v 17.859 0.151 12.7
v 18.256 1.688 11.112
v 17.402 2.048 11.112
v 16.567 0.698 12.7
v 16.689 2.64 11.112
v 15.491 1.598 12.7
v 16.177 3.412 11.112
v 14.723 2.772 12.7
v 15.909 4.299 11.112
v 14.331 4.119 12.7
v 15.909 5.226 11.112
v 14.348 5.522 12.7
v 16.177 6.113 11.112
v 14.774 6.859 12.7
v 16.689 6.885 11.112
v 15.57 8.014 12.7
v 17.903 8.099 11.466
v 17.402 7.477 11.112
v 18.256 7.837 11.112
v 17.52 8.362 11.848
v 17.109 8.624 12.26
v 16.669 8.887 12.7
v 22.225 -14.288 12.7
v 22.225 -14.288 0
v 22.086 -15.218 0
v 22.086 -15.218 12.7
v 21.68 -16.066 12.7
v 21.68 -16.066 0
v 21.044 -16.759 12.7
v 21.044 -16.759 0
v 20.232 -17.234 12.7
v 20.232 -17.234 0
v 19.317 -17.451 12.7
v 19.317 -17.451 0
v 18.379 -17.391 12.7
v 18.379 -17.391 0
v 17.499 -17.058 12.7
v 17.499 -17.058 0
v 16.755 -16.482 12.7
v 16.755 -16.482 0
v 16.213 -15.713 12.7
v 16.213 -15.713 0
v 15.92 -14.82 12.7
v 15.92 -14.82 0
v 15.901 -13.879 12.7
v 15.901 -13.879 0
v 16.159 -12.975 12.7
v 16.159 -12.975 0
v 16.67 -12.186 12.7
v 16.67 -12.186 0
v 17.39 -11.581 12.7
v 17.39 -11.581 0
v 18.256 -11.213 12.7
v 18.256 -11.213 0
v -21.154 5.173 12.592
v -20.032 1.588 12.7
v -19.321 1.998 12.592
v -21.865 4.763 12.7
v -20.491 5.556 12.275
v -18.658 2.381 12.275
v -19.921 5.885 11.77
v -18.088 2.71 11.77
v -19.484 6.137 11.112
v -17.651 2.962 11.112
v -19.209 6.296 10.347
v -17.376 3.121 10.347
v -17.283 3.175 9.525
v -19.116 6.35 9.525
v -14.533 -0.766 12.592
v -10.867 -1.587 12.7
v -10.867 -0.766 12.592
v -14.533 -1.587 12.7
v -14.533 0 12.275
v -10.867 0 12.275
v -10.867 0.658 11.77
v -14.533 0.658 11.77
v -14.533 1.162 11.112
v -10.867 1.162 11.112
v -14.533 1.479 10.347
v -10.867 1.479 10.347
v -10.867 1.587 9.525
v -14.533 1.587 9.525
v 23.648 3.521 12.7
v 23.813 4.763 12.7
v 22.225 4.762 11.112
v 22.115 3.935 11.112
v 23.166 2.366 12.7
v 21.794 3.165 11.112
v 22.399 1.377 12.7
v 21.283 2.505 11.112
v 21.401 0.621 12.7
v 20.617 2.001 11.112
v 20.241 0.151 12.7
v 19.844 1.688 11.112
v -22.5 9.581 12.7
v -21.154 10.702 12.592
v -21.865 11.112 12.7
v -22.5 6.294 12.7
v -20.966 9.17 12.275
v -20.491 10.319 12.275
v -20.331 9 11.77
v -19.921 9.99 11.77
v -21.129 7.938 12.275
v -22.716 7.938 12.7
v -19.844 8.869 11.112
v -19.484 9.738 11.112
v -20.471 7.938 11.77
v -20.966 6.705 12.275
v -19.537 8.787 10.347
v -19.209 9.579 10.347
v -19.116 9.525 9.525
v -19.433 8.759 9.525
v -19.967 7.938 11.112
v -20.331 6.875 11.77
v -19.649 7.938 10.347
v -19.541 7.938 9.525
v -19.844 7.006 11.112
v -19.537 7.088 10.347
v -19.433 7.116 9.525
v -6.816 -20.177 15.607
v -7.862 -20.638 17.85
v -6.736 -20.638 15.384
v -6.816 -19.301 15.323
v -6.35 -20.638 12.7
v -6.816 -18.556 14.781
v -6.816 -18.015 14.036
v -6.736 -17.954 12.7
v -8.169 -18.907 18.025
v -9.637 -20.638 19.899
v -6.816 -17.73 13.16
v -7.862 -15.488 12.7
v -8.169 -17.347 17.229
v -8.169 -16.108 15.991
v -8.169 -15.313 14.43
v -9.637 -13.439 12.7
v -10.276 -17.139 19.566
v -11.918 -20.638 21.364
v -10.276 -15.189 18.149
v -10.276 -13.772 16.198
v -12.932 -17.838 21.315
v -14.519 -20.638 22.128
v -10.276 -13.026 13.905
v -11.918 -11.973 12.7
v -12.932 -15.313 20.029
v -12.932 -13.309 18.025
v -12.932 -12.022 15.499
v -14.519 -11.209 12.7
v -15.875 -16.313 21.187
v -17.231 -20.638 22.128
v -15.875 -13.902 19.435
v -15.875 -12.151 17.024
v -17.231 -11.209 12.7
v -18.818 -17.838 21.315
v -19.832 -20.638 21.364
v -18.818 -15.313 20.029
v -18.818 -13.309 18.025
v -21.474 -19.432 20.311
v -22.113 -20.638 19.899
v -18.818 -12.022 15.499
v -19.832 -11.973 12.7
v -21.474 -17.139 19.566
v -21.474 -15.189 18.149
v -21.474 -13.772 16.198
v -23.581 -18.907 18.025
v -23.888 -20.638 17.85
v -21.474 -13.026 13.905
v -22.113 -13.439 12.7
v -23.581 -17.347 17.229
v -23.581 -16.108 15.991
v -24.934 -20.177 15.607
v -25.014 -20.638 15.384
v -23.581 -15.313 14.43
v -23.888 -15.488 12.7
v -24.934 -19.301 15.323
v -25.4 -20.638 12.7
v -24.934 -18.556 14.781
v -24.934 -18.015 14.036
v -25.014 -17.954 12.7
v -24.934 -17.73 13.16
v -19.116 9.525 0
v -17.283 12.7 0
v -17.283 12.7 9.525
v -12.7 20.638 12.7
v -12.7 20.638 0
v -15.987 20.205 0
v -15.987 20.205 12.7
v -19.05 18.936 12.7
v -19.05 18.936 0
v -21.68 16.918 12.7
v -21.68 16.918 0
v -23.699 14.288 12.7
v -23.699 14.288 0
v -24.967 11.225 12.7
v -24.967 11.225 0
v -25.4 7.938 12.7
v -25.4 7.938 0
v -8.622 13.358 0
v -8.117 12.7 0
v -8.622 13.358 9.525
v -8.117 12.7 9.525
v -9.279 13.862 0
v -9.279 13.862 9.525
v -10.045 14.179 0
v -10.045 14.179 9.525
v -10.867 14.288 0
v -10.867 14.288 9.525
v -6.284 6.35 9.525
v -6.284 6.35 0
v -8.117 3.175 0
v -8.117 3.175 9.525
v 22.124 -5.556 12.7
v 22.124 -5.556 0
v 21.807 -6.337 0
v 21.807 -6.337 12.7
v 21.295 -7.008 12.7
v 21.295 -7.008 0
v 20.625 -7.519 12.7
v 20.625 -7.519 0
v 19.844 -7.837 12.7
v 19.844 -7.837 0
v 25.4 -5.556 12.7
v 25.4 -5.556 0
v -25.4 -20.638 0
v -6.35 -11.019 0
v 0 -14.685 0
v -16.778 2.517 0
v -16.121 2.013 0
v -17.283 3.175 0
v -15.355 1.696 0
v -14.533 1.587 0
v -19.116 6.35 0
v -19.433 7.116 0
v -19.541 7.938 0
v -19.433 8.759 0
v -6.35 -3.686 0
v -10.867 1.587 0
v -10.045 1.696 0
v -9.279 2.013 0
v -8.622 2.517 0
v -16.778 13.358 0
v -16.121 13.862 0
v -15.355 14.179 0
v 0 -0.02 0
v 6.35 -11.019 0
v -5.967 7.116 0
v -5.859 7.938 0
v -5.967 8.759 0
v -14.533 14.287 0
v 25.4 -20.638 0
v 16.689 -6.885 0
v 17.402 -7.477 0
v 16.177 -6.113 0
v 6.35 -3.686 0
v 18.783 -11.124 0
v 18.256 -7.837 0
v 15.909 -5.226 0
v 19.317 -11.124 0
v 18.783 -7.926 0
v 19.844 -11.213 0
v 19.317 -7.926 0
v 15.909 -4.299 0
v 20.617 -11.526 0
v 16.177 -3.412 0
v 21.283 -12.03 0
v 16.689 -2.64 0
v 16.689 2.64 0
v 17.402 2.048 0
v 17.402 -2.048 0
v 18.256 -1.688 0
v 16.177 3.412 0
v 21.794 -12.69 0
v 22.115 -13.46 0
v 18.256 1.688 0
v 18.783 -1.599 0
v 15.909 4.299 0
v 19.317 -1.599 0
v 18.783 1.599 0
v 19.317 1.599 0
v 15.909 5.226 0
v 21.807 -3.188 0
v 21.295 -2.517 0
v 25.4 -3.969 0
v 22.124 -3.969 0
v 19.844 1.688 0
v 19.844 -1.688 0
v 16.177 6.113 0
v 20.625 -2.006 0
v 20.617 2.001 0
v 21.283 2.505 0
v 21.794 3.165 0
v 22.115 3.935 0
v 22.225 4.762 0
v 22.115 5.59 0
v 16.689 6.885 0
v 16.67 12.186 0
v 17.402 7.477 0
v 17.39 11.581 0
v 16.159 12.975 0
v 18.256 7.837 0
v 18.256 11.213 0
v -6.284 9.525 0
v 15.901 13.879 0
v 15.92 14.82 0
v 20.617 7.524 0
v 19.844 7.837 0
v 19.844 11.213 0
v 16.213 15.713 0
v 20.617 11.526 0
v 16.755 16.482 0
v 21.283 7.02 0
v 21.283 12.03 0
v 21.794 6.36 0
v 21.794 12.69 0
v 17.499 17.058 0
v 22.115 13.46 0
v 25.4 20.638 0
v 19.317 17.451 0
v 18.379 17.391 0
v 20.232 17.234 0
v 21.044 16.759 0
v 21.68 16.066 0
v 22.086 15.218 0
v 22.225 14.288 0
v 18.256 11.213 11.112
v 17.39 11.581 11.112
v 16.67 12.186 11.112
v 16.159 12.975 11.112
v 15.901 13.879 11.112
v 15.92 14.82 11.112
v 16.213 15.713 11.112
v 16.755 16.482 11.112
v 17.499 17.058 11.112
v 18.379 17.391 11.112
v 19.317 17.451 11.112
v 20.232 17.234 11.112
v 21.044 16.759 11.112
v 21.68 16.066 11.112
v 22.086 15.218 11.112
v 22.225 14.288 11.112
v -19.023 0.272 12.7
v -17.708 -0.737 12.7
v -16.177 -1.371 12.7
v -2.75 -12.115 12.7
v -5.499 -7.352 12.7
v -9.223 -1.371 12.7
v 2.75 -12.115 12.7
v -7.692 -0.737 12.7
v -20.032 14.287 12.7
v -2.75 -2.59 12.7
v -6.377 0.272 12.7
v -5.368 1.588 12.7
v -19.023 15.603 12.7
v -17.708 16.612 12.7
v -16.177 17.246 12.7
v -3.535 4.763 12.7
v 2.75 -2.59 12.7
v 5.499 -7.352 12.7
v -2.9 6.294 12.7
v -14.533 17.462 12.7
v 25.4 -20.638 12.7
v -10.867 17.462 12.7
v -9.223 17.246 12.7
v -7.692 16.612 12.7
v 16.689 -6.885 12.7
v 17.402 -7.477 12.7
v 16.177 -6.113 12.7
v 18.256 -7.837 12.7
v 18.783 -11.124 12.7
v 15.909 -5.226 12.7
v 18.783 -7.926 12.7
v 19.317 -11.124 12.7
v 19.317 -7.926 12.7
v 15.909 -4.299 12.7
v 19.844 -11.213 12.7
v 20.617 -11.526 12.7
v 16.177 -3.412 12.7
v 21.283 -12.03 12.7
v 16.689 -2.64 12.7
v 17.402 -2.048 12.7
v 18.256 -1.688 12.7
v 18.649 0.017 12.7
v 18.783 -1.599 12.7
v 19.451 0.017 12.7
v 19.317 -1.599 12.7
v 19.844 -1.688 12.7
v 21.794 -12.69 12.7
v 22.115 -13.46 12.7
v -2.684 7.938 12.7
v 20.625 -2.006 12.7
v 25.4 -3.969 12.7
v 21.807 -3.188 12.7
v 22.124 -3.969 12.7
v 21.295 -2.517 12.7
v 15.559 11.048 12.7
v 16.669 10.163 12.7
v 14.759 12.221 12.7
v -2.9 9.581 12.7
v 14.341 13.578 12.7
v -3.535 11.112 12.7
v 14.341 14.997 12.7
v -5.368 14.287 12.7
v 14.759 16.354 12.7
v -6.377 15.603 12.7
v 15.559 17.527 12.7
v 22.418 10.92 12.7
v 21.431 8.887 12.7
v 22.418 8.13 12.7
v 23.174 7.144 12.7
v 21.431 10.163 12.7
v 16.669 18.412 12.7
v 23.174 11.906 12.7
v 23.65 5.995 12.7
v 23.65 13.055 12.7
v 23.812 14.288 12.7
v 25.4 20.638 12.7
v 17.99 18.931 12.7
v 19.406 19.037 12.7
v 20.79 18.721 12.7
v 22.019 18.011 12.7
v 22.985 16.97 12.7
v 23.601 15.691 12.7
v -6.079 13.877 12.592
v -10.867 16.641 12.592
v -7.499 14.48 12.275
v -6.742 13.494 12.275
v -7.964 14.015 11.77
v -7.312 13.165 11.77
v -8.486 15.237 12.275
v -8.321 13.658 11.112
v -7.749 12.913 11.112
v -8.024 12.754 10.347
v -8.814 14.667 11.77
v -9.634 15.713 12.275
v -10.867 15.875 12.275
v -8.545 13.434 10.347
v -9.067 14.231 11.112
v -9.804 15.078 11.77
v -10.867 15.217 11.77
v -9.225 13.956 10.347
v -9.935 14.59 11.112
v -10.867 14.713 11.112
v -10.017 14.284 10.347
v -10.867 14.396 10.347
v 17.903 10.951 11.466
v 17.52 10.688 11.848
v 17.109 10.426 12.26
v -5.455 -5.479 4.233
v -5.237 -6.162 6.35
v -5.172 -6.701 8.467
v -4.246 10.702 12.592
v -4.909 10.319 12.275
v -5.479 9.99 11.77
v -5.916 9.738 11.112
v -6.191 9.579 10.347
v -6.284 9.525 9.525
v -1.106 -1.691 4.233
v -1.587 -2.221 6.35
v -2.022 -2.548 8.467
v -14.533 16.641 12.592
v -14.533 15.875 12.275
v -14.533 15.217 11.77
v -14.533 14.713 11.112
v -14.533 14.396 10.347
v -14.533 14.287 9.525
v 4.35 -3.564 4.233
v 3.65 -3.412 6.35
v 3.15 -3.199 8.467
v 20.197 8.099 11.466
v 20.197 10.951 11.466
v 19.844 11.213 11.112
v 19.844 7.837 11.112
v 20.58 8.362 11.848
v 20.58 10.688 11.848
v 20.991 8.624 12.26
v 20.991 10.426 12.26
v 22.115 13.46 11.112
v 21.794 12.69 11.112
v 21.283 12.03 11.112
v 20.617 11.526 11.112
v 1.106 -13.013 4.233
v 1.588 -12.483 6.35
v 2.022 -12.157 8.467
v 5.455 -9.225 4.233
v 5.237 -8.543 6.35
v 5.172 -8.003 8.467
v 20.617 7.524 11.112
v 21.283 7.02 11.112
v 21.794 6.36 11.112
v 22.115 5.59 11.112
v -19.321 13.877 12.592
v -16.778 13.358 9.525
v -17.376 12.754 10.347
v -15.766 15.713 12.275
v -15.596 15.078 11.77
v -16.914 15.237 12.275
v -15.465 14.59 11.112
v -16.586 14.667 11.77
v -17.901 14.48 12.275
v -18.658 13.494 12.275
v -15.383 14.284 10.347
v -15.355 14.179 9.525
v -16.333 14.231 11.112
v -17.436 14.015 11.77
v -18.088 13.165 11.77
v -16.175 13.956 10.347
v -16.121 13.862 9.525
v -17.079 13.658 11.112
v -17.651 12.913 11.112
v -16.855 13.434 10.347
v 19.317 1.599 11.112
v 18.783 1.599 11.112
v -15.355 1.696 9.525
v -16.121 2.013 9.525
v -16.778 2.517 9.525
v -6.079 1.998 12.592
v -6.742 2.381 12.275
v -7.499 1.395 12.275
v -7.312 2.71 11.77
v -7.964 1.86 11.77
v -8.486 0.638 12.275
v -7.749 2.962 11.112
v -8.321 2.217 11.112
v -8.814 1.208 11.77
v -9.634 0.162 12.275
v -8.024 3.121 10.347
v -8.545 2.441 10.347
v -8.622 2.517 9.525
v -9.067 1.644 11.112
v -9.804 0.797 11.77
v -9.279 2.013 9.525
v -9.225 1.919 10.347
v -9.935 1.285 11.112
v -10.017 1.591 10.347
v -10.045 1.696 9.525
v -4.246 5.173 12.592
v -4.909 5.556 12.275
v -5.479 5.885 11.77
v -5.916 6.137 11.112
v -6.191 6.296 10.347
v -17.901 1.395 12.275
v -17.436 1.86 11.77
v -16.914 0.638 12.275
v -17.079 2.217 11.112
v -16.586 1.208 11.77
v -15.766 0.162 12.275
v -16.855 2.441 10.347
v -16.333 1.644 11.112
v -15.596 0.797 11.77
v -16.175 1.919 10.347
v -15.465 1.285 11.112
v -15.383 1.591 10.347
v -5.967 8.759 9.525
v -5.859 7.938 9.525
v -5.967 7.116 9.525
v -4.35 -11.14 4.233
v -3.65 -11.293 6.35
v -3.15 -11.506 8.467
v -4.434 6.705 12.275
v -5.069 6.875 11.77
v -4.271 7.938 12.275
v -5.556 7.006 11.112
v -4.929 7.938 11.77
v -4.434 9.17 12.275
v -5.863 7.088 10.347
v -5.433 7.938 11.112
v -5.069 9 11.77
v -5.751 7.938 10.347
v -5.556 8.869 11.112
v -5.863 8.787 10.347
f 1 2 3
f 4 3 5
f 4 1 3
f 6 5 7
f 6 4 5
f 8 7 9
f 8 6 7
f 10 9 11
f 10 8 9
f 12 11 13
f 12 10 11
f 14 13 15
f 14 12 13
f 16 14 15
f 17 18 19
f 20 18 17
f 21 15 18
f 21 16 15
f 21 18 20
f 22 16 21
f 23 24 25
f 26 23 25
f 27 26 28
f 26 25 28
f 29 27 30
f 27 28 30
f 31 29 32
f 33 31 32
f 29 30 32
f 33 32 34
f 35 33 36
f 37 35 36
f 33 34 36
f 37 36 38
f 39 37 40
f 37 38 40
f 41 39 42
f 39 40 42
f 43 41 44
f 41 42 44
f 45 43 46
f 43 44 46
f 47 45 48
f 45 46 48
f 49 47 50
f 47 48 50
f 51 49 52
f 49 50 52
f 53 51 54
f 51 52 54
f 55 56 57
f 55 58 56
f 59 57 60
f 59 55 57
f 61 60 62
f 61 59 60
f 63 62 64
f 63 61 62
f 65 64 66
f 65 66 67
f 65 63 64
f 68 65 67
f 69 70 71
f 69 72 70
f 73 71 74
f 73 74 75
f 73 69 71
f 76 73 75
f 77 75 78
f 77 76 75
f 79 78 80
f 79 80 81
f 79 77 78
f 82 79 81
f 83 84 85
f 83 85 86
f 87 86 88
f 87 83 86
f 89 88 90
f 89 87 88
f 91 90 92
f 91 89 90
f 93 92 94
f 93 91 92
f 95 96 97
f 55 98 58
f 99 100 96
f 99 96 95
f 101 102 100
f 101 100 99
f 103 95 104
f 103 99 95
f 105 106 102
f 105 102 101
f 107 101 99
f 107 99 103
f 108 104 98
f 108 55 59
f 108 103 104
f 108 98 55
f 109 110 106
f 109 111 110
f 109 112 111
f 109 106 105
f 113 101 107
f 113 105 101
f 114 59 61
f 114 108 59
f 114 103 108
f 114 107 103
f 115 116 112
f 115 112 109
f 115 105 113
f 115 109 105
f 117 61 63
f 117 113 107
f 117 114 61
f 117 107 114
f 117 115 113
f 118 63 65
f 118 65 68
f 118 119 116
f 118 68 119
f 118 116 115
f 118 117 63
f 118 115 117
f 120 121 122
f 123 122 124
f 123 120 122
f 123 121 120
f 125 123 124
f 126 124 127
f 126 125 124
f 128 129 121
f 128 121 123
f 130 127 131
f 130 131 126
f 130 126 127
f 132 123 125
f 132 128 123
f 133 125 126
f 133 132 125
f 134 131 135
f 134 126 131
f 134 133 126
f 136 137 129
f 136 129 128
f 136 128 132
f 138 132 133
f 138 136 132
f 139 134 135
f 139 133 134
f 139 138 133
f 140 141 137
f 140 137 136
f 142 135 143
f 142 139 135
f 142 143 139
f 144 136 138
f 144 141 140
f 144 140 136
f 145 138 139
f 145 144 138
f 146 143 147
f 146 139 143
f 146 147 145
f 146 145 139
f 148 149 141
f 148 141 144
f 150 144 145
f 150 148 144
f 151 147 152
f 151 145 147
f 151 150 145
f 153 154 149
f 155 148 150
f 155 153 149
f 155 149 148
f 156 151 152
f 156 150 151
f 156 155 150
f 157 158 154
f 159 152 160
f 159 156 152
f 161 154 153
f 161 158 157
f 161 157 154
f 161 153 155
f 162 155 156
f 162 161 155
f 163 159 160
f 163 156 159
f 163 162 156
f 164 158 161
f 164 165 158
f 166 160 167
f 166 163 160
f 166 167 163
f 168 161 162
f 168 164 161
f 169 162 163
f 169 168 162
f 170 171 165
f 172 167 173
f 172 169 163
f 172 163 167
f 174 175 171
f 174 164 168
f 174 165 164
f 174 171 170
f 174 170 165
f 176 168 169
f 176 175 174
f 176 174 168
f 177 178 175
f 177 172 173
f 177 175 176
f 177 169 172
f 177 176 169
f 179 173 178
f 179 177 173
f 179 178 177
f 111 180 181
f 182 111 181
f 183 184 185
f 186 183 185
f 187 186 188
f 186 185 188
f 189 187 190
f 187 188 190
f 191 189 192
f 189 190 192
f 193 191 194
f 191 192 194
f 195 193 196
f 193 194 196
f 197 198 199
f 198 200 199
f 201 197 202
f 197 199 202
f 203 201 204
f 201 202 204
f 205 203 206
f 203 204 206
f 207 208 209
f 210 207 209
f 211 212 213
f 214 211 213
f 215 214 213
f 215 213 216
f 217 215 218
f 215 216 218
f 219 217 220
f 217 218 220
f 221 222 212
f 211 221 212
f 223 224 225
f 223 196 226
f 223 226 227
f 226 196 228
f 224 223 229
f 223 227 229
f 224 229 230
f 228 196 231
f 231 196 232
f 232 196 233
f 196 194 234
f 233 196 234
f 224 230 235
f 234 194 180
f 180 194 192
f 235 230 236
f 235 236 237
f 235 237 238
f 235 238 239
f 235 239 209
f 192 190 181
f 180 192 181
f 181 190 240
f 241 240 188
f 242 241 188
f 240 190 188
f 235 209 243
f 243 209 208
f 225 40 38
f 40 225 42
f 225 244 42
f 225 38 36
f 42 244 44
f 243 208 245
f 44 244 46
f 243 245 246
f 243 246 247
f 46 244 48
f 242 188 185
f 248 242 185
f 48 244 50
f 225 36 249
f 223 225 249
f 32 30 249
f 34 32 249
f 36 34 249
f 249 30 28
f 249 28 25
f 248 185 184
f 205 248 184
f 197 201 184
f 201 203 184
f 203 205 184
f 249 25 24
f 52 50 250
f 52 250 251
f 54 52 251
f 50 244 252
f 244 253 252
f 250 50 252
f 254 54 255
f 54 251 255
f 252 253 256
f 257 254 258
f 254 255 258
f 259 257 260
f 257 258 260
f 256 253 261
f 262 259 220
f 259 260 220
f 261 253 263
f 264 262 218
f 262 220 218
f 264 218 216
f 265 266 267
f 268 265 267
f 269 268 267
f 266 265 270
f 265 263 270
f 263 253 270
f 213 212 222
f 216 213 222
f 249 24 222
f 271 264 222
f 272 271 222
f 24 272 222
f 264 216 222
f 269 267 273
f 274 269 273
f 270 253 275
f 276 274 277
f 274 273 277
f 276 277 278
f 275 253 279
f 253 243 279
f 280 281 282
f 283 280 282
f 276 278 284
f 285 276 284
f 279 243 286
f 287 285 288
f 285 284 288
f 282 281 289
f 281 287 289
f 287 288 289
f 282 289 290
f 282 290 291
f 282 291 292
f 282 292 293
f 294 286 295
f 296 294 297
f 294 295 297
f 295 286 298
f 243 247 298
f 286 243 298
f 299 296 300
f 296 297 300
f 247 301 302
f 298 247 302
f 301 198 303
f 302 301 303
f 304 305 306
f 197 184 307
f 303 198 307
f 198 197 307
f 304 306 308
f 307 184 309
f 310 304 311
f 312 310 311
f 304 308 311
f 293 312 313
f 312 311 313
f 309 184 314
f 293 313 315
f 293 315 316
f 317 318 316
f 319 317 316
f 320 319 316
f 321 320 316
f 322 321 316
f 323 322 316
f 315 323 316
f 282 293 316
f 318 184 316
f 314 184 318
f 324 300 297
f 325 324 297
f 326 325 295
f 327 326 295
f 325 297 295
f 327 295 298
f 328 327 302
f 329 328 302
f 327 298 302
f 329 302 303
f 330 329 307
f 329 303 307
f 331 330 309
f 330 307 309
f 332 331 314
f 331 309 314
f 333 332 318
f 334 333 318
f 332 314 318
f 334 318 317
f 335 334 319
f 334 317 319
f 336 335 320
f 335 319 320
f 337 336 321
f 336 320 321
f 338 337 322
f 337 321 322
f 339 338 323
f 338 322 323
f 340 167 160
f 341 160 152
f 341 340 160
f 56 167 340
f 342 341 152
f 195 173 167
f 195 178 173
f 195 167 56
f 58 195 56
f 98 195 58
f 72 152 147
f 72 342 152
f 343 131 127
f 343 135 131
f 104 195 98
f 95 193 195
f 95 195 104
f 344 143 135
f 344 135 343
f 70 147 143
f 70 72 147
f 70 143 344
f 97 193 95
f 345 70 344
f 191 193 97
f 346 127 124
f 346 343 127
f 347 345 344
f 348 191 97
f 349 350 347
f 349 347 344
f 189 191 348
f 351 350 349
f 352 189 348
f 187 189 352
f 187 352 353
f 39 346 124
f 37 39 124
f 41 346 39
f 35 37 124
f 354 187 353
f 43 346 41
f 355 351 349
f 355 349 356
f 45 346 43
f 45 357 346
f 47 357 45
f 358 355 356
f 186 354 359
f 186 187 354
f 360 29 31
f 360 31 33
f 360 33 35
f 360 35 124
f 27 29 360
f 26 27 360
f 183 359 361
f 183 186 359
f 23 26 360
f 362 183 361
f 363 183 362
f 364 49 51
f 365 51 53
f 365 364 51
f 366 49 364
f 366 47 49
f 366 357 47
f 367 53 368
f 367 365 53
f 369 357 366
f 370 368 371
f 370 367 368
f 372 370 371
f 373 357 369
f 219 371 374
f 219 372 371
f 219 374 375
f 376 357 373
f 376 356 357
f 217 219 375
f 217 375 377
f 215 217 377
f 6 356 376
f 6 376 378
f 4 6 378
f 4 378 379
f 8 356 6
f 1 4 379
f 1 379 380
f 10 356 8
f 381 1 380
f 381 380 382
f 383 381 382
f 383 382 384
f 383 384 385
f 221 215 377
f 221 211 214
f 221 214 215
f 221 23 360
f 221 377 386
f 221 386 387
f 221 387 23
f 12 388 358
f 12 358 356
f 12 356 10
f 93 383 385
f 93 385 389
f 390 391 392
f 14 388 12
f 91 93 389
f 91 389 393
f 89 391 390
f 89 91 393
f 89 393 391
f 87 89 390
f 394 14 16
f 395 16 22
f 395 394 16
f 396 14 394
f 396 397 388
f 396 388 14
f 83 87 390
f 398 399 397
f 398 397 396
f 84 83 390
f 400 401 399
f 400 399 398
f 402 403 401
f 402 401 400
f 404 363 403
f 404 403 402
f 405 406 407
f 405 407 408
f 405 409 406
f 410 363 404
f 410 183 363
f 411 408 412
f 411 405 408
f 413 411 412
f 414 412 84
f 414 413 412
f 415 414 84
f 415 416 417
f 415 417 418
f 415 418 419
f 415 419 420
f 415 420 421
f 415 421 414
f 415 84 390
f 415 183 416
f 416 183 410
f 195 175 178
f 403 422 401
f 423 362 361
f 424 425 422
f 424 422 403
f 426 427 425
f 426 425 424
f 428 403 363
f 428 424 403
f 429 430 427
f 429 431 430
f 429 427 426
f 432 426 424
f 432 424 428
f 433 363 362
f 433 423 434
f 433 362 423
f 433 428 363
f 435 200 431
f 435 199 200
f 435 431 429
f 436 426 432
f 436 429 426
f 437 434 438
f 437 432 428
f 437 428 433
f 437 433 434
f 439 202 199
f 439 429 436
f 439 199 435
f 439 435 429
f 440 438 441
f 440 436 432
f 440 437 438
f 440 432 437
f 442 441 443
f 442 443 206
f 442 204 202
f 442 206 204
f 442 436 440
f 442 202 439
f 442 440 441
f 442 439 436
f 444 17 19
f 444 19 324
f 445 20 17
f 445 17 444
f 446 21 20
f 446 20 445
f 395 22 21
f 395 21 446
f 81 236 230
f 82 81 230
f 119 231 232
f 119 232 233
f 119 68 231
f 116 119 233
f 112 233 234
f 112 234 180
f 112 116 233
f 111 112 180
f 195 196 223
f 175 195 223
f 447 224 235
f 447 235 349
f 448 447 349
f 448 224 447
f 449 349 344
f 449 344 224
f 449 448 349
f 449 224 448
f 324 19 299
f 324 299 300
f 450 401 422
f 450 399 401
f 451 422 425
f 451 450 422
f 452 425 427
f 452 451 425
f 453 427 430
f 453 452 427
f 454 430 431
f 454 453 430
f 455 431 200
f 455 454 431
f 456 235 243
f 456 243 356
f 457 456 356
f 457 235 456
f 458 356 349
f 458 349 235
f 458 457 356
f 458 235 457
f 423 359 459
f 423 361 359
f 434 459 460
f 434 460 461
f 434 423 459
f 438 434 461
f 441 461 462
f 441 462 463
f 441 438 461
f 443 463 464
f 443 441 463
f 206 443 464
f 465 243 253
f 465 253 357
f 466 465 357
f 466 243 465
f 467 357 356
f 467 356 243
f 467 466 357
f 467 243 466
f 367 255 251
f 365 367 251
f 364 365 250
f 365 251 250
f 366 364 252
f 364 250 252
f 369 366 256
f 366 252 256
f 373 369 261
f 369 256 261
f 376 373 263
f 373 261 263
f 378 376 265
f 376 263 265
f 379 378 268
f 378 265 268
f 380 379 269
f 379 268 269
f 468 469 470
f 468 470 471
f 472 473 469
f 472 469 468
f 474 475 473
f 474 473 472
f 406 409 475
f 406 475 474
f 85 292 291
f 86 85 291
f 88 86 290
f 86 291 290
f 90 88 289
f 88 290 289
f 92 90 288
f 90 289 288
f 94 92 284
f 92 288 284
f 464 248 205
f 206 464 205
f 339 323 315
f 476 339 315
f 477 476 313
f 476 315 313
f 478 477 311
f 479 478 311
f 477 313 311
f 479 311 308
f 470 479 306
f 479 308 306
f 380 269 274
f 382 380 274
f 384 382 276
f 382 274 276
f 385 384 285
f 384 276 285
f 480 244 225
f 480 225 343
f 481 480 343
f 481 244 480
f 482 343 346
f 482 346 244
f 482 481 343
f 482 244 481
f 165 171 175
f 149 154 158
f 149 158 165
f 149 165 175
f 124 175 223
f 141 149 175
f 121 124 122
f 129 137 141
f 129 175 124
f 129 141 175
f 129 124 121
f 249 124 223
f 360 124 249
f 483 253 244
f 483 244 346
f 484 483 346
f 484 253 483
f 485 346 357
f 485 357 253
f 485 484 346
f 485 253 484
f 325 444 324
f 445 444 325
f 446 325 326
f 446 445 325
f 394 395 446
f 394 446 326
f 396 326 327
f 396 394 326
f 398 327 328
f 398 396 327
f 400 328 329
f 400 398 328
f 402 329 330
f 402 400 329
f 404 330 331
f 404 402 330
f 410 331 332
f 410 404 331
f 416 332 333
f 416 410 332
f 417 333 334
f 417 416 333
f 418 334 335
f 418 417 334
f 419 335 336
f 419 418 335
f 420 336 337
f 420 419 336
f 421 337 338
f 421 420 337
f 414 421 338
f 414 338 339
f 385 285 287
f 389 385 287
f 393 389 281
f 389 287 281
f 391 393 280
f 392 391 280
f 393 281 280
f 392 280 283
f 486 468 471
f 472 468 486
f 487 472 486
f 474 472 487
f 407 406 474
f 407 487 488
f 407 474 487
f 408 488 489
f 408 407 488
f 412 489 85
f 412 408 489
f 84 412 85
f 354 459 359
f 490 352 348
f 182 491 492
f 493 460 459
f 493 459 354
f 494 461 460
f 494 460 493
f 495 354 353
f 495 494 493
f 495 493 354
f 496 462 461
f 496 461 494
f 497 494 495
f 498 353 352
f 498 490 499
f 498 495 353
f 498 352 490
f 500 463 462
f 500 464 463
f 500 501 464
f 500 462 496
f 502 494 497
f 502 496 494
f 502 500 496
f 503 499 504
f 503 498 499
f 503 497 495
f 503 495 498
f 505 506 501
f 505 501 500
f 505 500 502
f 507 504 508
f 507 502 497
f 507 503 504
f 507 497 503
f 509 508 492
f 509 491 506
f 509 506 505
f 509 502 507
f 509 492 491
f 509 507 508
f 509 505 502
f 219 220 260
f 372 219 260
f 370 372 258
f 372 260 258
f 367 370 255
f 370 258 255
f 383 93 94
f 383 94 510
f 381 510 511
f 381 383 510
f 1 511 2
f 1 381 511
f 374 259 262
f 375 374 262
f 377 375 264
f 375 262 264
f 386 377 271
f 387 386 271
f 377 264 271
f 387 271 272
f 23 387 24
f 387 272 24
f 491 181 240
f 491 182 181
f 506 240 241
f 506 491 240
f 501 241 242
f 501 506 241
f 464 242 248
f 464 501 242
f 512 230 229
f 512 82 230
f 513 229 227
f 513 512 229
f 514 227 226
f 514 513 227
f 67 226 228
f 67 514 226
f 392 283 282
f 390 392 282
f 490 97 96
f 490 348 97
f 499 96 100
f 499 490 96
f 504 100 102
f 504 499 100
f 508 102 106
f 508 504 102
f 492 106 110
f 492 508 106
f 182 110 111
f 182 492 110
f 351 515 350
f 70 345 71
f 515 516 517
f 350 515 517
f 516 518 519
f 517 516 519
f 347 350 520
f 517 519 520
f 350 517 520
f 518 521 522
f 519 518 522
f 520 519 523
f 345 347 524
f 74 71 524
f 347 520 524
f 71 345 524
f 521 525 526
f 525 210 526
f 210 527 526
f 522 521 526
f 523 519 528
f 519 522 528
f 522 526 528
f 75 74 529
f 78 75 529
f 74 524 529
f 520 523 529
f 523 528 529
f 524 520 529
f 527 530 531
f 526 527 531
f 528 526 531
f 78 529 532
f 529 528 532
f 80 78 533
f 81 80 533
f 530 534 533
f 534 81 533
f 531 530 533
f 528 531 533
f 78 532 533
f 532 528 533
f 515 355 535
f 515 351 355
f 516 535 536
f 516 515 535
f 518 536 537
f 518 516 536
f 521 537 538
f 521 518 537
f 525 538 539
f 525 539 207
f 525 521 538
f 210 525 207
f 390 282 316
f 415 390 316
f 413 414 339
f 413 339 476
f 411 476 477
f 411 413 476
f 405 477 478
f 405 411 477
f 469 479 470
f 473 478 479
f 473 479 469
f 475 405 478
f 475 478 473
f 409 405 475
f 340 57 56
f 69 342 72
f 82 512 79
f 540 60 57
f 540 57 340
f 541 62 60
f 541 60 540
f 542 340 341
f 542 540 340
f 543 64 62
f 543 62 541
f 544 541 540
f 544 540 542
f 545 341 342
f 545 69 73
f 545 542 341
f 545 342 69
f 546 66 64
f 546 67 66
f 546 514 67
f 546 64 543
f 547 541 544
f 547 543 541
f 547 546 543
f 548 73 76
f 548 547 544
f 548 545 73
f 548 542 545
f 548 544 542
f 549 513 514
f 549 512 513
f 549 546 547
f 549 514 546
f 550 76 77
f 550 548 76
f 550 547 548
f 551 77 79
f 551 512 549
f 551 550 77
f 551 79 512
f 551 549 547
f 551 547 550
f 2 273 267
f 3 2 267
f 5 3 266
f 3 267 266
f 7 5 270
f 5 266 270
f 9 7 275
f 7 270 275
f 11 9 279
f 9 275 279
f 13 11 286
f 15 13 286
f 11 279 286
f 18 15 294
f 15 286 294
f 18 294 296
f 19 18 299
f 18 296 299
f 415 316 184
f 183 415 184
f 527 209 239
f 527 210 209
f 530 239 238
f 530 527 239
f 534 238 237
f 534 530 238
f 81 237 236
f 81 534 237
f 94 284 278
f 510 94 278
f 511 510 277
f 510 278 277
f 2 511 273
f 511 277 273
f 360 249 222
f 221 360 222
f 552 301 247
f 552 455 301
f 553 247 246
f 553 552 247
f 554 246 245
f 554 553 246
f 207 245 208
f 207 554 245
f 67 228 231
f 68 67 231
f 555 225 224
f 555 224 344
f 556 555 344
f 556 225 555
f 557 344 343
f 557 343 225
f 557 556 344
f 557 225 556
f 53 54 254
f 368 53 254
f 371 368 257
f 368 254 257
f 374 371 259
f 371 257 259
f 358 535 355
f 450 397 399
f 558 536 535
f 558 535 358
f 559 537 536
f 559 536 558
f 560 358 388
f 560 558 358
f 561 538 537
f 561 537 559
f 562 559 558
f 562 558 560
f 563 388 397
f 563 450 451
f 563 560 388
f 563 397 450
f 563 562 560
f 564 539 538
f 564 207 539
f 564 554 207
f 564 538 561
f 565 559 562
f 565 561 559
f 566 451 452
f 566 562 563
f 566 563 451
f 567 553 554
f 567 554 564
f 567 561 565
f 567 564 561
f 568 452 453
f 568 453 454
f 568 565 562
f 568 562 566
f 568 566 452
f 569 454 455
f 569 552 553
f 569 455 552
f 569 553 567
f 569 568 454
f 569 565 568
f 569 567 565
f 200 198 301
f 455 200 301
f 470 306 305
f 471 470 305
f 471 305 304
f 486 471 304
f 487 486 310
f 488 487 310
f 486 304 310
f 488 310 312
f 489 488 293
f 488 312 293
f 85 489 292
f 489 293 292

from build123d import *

# Parameters (mm, degrees)
F1_DEPTH = 12.7
F2_SIZE  = 1.5875
F3_R     = 3.175
F8_ANGLE = 90


with BuildPart() as f1:
    # F0 (on Top) → F1 (new body)
    with BuildSketch(Plane.XY):
        with BuildLine():
            Line((25.4, 20.6375), (-12.7, 20.6375))
            ThreePointArc((-12.7, 20.6375), (-21.6802561211, 16.9177561211), (-25.4, 7.9375))
            Line((-25.4, 7.9375), (-25.4, -20.6375))
            Line((-25.4, -20.6375), (25.4, -20.6375))
            Line((25.4, -20.6375), (25.4, -5.55625))
            Line((25.4, -5.55625), (22.1241805311, -5.55625))
            ThreePointArc((22.1241805311, -5.55625), (21.2950640303, -7.0075640303), (19.84375, -7.8366805311))
            Line((19.84375, -7.8366805311), (19.84375, -11.2133194689))
            ThreePointArc((19.84375, -11.2133194689), (21.5600578928, -12.3432175167), (22.225, -14.2875))
            ThreePointArc((22.225, -14.2875), (17.1057175167, -16.7975578928), (18.25625, -11.2133194689))
            Line((18.25625, -11.2133194689), (18.25625, -7.8366805311))
            ThreePointArc((18.25625, -7.8366805311), (15.875, -4.7625), (18.25625, -1.6883194689))
            Line((18.25625, -1.6883194689), (18.25625, 1.6883194689))
            ThreePointArc((18.25625, 1.6883194689), (15.875, 4.7625), (18.25625, 7.8366805311))
            Line((18.25625, 7.8366805311), (18.25625, 11.2133194689))
            ThreePointArc((18.25625, 11.2133194689), (17.1057175167, 16.7975578928), (22.225, 14.2875))
            ThreePointArc((22.225, 14.2875), (21.5600578928, 12.3432175167), (19.84375, 11.2133194689))
            Line((19.84375, 11.2133194689), (19.84375, 7.8366805311))
            ThreePointArc((19.84375, 7.8366805311), (21.5600578928, 6.7067824833), (22.225, 4.7625))
            ThreePointArc((22.225, 4.7625), (21.5600578928, 2.8182175167), (19.84375, 1.6883194689))
            Line((19.84375, 1.6883194689), (19.84375, -1.6883194689))
            ThreePointArc((19.84375, -1.6883194689), (21.2950640303, -2.5174359697), (22.1241805311, -3.96875))
            Line((22.1241805311, -3.96875), (25.4, -3.96875))
            Line((25.4, -3.96875), (25.4, 20.6375))
        make_face()
        Polygon((-5.3676515813, 7.9375), (-9.0338257906, 1.5875), (-16.3661742094, 1.5875), (-20.0323484187, 7.9375), (-16.3661742094, 14.2875), (-9.0338257906, 14.2875), align=None, mode=Mode.SUBTRACT)
        with BuildLine():
            Line((19.84375, -11.2133194689), (19.84375, -7.8366805311))
            ThreePointArc((19.84375, -7.8366805311), (19.05, -7.9375), (18.25625, -7.8366805311))
            Line((18.25625, -7.8366805311), (18.25625, -11.2133194689))
            ThreePointArc((18.25625, -11.2133194689), (19.05, -11.1125), (19.84375, -11.2133194689))
        make_face()
        with BuildLine():
            ThreePointArc((18.25625, -1.6883194689), (19.05, -1.5875), (19.84375, -1.6883194689))
            Line((19.84375, -1.6883194689), (19.84375, 1.6883194689))
            ThreePointArc((19.84375, 1.6883194689), (19.05, 1.5875), (18.25625, 1.6883194689))
            Line((18.25625, 1.6883194689), (18.25625, -1.6883194689))
        make_face()
    extrude(amount=F1_DEPTH)

    # F2
    f2_edges = [f1.edges().sort_by_distance(p)[0] for p in [
        (19.05, 1.5875, 12.7),
        (19.05, 17.4625, 12.7),
        (18.25625, 9.525, 12.7),
        (19.84375, 9.525, 12.7),
    ]]
    chamfer(f2_edges, length=F2_SIZE)

    # F3
    f3_edges = [f1.edges().sort_by_distance(p)[0] for p in [
        (-7.200739, 4.7625, 12.7),
        (-7.200739, 11.1125, 12.7),
        (-12.7, 14.2875, 12.7),
        (-18.199261, 11.1125, 12.7),
        (-18.199261, 4.7625, 12.7),
        (-12.7, 1.5875, 12.7),
        (-16.366174, 14.2875, 6.35),
        (-20.032348, 7.9375, 6.35),
        (-16.366174, 1.5875, 6.35),
        (-9.033826, 1.5875, 6.35),
        (-5.367652, 7.9375, 6.35),
        (-9.033826, 14.2875, 6.35),
    ]]
    fillet(f3_edges, radius=F3_R)

    # F5 (on face) → F6 section 0
    with BuildSketch(Plane(origin=(0, 0, 0), x_dir=(1, 0, 0), z_dir=(0, 0, -1))):
        Polygon((-6.35, 11.0185455743), (-6.35, 3.6861971556), (0, 0.0200229463), (6.35, 3.6861971556), (6.35, 11.0185455743), (0, 14.6847197837), align=None)
    # F4 (on face) → F6 section 1
    with BuildSketch(Plane.XY.offset(12.7)):
        Polygon((2.749630657, -2.589871365), (-2.749630657, -2.589871365), (-5.499261314, -7.352371365), (-2.749630657, -12.114871365), (2.749630657, -12.114871365), (5.499261314, -7.352371365), align=None)
    loft(mode=Mode.SUBTRACT)

    # F7 (on face) → F8 (revolve)
    with BuildSketch(Plane.XZ.offset(20.6375)):
        with BuildLine():
            Line((-25.4, 12.7), (-6.35, 12.7))
            ThreePointArc((-6.35, 12.7), (-15.875, 22.225), (-25.4, 12.7))
        make_face()
    revolve(axis=Axis((-15.875, -20.6375, 12.7), (-1, 0, 0)), revolution_arc=F8_ANGLE)


solid = f1.part
